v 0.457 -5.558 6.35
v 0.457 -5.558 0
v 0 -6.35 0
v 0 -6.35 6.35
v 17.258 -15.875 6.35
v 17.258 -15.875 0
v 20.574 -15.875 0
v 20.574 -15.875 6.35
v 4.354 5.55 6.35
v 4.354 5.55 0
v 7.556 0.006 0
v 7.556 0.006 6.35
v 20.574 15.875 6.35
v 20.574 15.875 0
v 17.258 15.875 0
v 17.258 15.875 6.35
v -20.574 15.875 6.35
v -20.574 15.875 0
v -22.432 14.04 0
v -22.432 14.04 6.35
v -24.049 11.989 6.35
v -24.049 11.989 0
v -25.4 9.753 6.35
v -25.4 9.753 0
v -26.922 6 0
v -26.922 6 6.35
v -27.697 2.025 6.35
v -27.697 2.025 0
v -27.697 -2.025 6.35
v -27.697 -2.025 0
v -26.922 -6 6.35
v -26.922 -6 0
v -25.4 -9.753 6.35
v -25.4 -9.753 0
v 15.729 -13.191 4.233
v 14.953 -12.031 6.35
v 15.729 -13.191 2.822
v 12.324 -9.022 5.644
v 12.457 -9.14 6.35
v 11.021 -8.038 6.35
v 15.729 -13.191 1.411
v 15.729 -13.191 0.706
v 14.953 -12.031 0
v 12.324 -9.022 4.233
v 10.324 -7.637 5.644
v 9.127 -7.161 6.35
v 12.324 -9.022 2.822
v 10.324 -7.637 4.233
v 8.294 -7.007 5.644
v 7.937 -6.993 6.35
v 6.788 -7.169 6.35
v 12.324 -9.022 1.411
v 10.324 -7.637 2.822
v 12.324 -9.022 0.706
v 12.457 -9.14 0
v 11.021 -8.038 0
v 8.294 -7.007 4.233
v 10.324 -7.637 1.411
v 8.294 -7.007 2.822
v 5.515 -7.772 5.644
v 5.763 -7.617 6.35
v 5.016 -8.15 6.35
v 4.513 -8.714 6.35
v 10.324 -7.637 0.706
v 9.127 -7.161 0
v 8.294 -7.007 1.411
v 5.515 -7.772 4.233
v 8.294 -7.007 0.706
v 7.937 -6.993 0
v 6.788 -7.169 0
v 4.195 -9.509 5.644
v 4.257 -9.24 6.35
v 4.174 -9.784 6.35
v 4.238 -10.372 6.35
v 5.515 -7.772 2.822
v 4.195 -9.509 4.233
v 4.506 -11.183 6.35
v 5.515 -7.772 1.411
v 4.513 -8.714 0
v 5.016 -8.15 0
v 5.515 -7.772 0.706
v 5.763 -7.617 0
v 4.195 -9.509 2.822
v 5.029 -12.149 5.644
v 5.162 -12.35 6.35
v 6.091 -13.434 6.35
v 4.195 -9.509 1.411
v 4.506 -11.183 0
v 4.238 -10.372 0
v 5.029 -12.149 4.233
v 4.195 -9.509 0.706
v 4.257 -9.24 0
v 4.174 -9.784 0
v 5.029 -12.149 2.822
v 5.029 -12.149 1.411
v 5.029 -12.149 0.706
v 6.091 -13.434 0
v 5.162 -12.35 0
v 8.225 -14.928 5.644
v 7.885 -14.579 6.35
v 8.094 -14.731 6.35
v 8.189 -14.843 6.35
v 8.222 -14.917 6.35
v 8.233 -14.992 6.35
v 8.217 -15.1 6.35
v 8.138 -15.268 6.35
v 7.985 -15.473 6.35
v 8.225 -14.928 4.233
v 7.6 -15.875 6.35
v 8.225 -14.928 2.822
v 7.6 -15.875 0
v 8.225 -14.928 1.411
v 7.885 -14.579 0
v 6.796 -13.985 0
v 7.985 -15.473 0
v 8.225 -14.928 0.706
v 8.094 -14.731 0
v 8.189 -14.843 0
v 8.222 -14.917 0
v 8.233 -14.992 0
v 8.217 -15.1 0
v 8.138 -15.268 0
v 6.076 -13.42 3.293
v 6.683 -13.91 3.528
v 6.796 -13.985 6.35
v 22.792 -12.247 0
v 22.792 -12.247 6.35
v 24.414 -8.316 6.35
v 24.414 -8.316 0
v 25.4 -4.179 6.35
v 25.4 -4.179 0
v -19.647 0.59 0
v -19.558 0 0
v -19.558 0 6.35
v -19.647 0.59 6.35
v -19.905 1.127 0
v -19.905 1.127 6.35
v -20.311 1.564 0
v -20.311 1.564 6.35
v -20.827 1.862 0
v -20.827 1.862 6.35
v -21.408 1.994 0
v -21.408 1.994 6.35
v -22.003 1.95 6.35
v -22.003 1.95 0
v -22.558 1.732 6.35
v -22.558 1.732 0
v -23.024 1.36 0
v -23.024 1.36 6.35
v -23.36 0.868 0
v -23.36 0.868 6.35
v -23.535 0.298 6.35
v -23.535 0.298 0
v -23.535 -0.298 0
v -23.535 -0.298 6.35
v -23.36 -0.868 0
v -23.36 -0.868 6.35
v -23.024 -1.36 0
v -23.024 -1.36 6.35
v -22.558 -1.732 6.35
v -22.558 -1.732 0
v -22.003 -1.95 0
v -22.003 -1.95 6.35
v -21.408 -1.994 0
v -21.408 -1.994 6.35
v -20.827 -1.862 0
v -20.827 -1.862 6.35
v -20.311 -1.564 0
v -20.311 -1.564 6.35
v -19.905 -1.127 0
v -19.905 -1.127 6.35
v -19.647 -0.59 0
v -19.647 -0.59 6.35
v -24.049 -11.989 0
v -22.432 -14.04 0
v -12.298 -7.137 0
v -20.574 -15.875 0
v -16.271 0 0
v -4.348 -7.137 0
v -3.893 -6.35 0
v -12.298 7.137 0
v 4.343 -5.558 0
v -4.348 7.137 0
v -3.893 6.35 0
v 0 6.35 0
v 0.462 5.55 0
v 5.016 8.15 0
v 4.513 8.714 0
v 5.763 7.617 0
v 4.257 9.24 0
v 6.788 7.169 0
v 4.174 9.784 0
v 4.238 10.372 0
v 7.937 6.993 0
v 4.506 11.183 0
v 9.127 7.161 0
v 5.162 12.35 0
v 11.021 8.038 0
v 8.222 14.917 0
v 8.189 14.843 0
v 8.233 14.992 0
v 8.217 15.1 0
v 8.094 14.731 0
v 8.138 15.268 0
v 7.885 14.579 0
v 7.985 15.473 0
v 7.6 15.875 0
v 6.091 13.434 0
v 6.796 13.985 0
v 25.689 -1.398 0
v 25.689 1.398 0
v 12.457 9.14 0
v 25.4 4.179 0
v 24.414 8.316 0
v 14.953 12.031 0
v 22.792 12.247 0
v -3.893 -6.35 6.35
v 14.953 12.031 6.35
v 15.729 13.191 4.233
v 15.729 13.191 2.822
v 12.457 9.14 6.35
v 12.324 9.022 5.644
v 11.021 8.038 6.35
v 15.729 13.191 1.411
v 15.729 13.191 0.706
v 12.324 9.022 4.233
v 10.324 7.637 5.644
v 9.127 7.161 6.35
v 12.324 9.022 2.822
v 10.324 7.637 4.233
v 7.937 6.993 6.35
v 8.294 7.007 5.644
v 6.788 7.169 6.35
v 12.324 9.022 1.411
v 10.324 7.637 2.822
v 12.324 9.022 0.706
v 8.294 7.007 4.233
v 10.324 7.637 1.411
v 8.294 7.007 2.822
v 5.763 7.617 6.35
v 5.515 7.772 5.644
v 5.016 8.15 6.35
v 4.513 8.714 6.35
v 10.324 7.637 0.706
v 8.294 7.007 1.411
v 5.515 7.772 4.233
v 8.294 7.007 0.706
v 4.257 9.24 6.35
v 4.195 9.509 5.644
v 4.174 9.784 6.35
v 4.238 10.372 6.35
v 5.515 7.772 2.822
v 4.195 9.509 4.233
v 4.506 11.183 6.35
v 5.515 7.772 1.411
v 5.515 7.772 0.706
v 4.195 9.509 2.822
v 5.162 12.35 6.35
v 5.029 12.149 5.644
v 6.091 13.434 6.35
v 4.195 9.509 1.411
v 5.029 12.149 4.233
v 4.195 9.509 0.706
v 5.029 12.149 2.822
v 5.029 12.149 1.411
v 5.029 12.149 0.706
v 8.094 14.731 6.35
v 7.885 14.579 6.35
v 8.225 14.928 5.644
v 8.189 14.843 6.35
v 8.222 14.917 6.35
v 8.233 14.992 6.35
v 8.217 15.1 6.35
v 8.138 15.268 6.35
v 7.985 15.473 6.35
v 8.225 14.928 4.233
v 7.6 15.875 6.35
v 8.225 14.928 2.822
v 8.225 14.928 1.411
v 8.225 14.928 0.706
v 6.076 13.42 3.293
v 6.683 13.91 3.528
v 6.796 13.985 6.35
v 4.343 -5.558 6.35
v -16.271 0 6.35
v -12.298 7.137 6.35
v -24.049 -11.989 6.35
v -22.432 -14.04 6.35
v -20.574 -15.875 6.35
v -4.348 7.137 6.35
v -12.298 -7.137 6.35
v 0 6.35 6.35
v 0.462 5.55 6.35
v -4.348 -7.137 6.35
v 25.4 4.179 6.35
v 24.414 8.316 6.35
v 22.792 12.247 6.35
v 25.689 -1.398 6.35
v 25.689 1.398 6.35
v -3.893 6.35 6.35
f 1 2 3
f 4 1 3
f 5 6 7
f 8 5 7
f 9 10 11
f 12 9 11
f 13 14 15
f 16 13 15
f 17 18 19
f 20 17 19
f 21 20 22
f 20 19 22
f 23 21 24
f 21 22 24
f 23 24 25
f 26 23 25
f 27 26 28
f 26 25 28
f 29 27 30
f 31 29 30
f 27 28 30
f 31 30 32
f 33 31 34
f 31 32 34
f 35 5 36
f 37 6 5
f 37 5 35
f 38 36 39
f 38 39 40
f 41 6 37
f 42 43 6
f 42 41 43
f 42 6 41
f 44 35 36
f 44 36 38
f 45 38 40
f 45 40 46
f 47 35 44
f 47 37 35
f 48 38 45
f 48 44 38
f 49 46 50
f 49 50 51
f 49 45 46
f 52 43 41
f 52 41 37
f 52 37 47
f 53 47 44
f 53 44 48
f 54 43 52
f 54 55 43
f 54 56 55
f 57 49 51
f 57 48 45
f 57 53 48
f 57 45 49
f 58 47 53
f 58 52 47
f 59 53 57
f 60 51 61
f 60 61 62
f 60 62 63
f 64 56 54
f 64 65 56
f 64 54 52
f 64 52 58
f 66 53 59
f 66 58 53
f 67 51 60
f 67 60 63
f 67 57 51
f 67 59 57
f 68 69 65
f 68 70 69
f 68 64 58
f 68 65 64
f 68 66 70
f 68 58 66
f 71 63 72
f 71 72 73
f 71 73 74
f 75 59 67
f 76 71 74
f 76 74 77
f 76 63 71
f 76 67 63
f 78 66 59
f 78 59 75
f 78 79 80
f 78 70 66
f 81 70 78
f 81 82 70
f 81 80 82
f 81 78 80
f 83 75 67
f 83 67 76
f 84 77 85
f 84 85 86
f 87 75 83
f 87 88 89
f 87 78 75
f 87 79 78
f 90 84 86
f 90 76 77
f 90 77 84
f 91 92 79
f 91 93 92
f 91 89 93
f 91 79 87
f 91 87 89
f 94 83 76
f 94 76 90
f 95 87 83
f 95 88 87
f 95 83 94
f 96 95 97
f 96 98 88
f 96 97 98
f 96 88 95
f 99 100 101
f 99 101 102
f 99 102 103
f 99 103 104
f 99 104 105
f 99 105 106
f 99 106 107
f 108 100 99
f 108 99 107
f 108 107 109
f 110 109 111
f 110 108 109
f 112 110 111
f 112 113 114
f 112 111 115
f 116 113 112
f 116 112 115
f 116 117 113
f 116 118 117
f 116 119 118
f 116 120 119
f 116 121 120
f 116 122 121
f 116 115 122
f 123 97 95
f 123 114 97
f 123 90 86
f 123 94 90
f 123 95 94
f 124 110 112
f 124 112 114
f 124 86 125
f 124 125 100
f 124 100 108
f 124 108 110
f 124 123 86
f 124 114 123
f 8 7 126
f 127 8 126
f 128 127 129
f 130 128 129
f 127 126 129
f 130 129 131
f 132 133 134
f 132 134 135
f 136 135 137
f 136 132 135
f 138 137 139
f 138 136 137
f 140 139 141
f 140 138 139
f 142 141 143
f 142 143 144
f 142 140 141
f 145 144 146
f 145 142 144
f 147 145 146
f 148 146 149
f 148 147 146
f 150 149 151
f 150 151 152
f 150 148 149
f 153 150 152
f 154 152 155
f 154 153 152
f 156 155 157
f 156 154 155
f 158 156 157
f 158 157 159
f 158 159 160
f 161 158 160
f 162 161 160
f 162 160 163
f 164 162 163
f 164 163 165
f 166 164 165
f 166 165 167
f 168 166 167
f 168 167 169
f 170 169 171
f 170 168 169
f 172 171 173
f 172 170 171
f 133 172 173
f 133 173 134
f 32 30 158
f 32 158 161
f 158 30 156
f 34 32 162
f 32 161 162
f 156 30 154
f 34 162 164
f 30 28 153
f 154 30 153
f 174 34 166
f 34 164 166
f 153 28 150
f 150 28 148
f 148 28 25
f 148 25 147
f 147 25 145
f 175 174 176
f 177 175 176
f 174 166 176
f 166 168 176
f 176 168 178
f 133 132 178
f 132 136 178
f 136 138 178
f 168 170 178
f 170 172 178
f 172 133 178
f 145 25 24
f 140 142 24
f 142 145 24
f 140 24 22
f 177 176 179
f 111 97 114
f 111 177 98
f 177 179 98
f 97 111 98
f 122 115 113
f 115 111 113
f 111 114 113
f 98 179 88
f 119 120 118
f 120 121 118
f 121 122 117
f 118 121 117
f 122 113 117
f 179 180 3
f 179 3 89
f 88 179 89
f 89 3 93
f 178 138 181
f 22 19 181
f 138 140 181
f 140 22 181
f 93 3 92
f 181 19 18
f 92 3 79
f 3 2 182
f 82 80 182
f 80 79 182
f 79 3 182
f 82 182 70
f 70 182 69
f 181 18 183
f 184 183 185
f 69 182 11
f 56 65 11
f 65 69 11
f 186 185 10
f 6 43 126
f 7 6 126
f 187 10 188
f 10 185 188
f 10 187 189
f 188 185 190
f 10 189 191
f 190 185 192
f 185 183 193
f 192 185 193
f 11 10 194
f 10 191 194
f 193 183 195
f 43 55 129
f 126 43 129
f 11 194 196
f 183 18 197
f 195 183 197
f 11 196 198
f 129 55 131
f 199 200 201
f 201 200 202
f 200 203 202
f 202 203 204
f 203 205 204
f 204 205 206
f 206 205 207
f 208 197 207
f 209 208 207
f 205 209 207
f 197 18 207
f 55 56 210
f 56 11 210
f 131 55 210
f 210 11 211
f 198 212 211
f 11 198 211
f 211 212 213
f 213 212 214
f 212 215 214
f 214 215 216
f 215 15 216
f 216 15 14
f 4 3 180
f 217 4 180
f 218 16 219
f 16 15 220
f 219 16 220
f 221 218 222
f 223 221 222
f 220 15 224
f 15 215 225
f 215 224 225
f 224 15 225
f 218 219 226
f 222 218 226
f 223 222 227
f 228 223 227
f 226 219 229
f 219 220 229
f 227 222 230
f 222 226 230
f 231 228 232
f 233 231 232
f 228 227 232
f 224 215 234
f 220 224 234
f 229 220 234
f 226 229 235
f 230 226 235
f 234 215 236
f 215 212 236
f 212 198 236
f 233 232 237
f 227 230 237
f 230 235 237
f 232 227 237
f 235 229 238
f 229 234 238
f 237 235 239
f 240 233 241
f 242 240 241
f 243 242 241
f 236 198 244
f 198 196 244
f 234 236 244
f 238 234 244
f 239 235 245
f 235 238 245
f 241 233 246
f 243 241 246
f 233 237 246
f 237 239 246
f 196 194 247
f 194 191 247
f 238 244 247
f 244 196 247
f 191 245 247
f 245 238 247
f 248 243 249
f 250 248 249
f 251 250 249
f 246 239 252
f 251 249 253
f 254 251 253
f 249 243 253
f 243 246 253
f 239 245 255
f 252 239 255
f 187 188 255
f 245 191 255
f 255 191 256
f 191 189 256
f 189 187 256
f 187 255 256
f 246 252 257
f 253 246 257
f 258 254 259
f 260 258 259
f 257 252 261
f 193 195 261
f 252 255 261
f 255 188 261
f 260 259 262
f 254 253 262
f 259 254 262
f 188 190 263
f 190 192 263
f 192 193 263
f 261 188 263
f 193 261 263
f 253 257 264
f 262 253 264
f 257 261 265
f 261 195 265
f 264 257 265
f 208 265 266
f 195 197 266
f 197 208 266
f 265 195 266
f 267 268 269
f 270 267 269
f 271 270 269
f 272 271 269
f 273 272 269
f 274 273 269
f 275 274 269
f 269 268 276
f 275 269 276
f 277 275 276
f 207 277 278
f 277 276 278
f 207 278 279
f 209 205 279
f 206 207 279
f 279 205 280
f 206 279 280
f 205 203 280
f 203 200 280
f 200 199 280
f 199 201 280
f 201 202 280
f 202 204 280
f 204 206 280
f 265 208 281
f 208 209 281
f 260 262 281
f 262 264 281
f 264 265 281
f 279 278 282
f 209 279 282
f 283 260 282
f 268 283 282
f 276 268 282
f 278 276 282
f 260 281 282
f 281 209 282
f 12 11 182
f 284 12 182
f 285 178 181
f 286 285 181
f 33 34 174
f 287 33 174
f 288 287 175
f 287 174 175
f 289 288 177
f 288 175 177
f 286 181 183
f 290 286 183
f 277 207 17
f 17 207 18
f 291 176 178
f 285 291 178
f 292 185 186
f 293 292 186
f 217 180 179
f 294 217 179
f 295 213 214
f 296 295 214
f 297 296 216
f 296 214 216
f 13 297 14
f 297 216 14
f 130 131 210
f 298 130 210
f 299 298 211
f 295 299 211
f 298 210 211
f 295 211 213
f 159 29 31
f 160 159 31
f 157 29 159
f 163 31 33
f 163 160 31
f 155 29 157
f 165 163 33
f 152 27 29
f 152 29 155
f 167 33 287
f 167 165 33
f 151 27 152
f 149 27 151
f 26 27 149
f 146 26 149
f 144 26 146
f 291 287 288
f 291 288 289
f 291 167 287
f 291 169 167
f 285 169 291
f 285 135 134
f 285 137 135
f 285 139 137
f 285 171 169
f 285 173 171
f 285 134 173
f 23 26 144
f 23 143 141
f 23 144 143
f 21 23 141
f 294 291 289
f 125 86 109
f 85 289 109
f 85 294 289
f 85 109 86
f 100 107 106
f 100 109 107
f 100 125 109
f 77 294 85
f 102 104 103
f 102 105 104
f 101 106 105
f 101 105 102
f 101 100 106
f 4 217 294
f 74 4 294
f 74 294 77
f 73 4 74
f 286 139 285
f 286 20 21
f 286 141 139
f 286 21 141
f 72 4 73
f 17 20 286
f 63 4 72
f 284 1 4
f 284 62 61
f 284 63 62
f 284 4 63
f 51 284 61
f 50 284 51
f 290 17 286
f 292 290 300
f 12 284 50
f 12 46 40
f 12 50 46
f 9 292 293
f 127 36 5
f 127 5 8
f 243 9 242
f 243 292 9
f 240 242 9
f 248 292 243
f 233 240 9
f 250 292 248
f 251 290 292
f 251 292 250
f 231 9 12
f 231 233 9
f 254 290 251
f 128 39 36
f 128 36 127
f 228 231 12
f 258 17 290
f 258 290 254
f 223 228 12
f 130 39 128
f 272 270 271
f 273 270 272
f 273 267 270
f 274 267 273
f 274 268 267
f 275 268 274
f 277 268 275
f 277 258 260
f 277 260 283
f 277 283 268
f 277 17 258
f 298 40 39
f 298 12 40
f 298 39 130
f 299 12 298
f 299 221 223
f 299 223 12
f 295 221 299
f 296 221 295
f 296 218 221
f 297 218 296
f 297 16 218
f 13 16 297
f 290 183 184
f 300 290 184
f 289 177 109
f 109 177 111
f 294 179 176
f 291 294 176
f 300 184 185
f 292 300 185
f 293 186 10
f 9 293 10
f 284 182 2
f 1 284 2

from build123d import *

# Parameters (mm, degrees)
F0_R     = 2
F1_DEPTH = 6.35


with BuildPart() as f1:
    # F0 (on Top) → F1 (new body)
    with BuildSketch(Plane.XY):
        with BuildLine():
            Line((-25.4, -9.7533396771), (-25.4, 9.7533396771))
            ThreePointArc((-25.4, 9.7533396771), (-27.7943947705, 0), (-25.4, -9.7533396771))
        make_face()
        with BuildLine():
            Line((7.5996425003, 15.875), (-20.574, 15.875))
            ThreePointArc((-20.574, 15.875), (-23.2726776835, 13.0393833309), (-25.4, 9.7533396771))
            Line((-25.4, 9.7533396771), (-25.4, -9.7533396771))
            ThreePointArc((-25.4, -9.7533396771), (-23.2726776835, -13.0393833309), (-20.574, -15.875))
            Line((-20.574, -15.875), (7.5996425003, -15.875))
            add(Edge.make_bspline(
                [(17.2575954348, -15.875), (16.8118674755, -15.0360308318), (15.7777378861, -13.0895457095), (12.6385533239, -8.7628284751), (8.4438454096, -6.4903546022), (5.4576611574, -7.5578133093), (3.6996913649, -9.434816458), (4.9096520026, -12.30721807), (6.6995754798, -14.1477736043), (8.6865320781, -14.7997007485), (7.9445844593, -15.5337364181), (7.5996425003, -15.875)],
                knots=[0, 0, 0, 0, 0.1172509784, 0.2720329825, 0.4136469471, 0.5269156212, 0.6254604471, 0.7364742974, 0.8471369559, 0.9289318052, 1, 1, 1, 1], degree=3))
            Line((17.2575954348, -15.875), (19.5524021983, -15.875))
            ThreePointArc((19.5524021983, -15.875), (24.535980368, 0), (19.5524021983, 15.875))
            Line((19.5524021983, 15.875), (17.2575954348, 15.875))
            add(Edge.make_bspline(
                [(17.2575954348, 15.875), (16.8118674755, 15.0360308318), (15.7777378861, 13.0895457095), (12.6385533239, 8.7628284751), (8.4438454096, 6.4903546022), (5.4576611574, 7.5578133093), (3.6996913649, 9.434816458), (4.9096520026, 12.30721807), (6.6995754798, 14.1477736043), (8.6865320781, 14.7997007485), (7.9445844593, 15.5337364181), (7.5996425003, 15.875)],
                knots=[0, 0, 0, 0, 0.1172509784, 0.2720329825, 0.4136469471, 0.5269156212, 0.6254604471, 0.7364742974, 0.8471369559, 0.9289318052, 1, 1, 1, 1], degree=3))
        make_face()
        with Locations((-21.5576495975, 0)):
            Circle(F0_R, mode=Mode.SUBTRACT)
        Polygon((-16.2712801248, 0), (-12.2982449182, 7.1374), (-4.3480449182, 7.1374), (-3.8934393163, 6.35), (0, 6.35), (0.4617137668, 5.5502882974), (4.3540745974, 5.5502882974), (7.5559447504, 0.0061843585), (4.3434, -5.5581063708), (0.4572, -5.5581063708), (0, -6.35), (-3.8934393163, -6.35), (-4.3480449182, -7.1374), (-12.2982449182, -7.1374), align=None, mode=Mode.SUBTRACT)
        with BuildLine():
            ThreePointArc((25.4, -4.1788812389), (25.7248773783, 0), (25.4, 4.1788812389))
            Line((25.4, 4.1788812389), (25.4, -4.1788812389))
        make_face()
        with BuildLine():
            Line((20.574, 15.875), (19.5524021983, 15.875))
            ThreePointArc((19.5524021983, 15.875), (24.535980368, 0), (19.5524021983, -15.875))
            Line((19.5524021983, -15.875), (20.574, -15.875))
            ThreePointArc((20.574, -15.875), (23.6807693851, -10.3132006276), (25.4, -4.1788812389))
            Line((25.4, -4.1788812389), (25.4, 4.1788812389))
            ThreePointArc((25.4, 4.1788812389), (23.6807693851, 10.3132006276), (20.574, 15.875))
        make_face()
    extrude(amount=F1_DEPTH)


solid = f1.part
